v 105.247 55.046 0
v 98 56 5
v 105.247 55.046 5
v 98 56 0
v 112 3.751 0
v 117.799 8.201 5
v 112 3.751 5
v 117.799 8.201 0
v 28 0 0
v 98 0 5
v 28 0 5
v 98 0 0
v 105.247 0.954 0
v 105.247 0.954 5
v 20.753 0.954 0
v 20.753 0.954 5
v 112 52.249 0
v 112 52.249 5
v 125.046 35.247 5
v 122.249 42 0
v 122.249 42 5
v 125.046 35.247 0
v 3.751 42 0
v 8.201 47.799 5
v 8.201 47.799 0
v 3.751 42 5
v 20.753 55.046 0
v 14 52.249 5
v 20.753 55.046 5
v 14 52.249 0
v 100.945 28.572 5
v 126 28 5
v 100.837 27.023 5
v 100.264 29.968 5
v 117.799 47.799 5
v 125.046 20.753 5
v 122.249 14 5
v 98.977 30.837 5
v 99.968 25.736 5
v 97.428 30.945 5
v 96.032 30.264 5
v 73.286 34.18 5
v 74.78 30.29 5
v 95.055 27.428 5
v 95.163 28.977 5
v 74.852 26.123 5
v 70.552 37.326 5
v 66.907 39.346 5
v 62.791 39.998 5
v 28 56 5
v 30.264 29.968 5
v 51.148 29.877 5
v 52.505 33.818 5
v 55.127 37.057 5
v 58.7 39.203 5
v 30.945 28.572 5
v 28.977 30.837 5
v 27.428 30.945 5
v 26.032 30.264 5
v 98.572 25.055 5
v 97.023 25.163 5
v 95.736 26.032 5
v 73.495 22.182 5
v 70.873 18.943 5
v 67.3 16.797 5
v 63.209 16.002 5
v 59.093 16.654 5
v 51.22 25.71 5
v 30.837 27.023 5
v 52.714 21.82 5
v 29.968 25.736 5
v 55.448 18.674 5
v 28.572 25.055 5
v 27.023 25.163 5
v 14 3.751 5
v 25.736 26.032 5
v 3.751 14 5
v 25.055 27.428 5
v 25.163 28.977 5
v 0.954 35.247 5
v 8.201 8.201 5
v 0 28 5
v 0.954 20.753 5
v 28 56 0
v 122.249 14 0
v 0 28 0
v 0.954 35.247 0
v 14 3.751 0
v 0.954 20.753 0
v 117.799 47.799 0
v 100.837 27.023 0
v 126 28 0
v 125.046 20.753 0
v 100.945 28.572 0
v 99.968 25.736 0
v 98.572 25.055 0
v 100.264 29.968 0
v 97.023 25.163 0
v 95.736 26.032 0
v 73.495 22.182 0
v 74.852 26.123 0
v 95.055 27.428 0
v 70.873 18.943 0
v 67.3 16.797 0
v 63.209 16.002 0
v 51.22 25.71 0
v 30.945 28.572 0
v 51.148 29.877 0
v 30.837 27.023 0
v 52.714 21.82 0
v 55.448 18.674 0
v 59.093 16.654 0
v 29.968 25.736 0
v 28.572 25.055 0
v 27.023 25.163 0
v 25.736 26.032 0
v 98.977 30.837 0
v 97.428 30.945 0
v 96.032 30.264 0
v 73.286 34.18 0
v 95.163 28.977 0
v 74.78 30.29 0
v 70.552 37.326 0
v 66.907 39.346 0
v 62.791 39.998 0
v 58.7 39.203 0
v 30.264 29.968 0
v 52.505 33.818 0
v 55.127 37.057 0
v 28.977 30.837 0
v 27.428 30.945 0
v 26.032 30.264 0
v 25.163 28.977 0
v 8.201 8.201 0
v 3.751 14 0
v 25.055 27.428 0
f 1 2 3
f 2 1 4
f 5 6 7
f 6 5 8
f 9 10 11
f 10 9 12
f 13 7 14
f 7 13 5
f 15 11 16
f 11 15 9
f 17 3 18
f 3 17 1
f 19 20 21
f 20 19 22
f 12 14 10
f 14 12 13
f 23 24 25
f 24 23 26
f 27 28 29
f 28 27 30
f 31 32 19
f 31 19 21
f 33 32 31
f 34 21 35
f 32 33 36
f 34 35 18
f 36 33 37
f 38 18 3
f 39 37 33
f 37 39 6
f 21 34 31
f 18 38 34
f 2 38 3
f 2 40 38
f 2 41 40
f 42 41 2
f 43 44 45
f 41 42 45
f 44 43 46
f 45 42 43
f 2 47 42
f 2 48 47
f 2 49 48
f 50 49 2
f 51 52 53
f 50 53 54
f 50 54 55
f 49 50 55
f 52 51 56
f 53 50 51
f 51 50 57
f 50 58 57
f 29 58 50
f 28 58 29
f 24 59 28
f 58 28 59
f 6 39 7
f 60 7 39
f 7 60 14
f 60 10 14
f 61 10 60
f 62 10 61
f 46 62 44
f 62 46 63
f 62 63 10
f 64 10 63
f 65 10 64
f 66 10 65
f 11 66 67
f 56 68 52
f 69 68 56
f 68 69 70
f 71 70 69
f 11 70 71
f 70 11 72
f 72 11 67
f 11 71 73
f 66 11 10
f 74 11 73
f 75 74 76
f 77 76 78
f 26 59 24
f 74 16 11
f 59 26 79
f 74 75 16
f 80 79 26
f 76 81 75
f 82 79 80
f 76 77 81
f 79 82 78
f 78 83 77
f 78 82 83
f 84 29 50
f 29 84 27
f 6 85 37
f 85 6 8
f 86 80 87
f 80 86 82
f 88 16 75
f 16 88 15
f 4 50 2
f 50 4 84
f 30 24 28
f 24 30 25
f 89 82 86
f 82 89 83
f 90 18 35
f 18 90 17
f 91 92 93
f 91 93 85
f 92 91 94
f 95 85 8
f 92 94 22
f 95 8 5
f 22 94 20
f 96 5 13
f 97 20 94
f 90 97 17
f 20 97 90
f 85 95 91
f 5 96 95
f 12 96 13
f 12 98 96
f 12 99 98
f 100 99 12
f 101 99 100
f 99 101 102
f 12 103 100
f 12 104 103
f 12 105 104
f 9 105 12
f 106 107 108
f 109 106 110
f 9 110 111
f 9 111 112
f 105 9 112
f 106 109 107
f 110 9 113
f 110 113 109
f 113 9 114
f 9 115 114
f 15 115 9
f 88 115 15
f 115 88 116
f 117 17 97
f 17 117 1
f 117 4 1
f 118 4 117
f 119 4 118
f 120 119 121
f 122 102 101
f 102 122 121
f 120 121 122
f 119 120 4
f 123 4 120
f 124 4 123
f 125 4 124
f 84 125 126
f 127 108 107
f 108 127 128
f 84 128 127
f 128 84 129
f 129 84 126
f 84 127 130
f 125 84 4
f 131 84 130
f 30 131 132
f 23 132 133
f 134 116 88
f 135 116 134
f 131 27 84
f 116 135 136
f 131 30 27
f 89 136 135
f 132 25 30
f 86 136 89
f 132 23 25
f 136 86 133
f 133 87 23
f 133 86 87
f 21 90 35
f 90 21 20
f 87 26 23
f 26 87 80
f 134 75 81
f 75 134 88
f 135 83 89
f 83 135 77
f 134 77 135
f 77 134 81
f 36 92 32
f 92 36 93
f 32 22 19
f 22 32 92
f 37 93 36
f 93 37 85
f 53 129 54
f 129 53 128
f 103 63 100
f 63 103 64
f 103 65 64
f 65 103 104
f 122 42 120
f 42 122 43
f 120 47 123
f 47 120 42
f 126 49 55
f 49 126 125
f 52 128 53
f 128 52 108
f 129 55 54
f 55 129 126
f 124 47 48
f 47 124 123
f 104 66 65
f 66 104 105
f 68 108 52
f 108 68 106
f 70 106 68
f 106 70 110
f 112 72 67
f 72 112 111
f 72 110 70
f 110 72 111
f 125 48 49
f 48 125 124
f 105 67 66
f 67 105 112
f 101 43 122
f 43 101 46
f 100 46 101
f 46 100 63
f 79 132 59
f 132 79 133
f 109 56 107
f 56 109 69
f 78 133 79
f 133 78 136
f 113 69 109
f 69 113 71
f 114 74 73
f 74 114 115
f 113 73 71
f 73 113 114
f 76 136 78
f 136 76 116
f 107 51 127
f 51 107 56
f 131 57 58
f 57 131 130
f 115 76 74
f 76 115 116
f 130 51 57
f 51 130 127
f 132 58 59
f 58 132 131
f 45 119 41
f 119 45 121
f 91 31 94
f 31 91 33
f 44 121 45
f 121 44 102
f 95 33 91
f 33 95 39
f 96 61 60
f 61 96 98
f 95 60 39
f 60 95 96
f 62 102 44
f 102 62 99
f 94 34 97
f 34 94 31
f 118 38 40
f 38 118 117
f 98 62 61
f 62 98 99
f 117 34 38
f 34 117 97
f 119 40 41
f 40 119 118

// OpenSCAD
$fn = 32;

// ----------------------------------------------------------------------
// Spacer plate: obround span 70, caps R28
// ----------------------------------------------------------------------

// --- parameters (mm) ---
bore_r = 12;              // centre bore radius
bolt_r = 3;               // bolt hole radius
plate_t = 5;              // plate thickness, Z (extrusion height)
span = 70;                // obround span
cap_r = 28;               // cap radius

profile = [[28, 56], [20.753, 55.046], [14, 52.249], [8.201, 47.799], [3.751, 42], [0.954, 35.247], [0, 28], [0.954, 20.753], [3.751, 14], [8.201, 8.201], [14, 3.751], [20.753, 0.954], [28, 0], [98, 0], [105.247, 0.954], [112, 3.751], [117.799, 8.201], [122.249, 14], [125.046, 20.753], [126, 28], [125.046, 35.247], [122.249, 42], [117.799, 47.799], [112, 52.249], [105.247, 55.046], [98, 56]];  // primary outline, 26 points, counter clockwise
void_1 = [[74.78, 30.29], [73.286, 34.18], [70.552, 37.326], [66.907, 39.346], [62.791, 39.998], [58.7, 39.203], [55.127, 37.057], [52.505, 33.818], [51.148, 29.877], [51.22, 25.71], [52.714, 21.82], [55.448, 18.674], [59.093, 16.654], [63.209, 16.002], [67.3, 16.797], [70.873, 18.943], [73.495, 22.182], [74.852, 26.123]];  // centre bore, 18 points
void_2 = [[30.945, 28.572], [30.264, 29.968], [28.977, 30.837], [27.428, 30.945], [26.032, 30.264], [25.163, 28.977], [25.055, 27.428], [25.736, 26.032], [27.023, 25.163], [28.572, 25.055], [29.968, 25.736], [30.837, 27.023]];  // end hole, 12 points
void_3 = [[100.945, 28.572], [100.264, 29.968], [98.977, 30.837], [97.428, 30.945], [96.032, 30.264], [95.163, 28.977], [95.055, 27.428], [95.736, 26.032], [97.023, 25.163], [98.572, 25.055], [99.968, 25.736], [100.837, 27.023]];  // end hole, 12 points

// --- the one profile operation ---
difference() {
  linear_extrude(height = plate_t) polygon(points = profile);
  translate([0, 0, -1])
    linear_extrude(height = plate_t + 2) polygon(points = void_1);
  translate([0, 0, -1])
    linear_extrude(height = plate_t + 2) polygon(points = void_2);
  translate([0, 0, -1])
    linear_extrude(height = plate_t + 2) polygon(points = void_3);
}
